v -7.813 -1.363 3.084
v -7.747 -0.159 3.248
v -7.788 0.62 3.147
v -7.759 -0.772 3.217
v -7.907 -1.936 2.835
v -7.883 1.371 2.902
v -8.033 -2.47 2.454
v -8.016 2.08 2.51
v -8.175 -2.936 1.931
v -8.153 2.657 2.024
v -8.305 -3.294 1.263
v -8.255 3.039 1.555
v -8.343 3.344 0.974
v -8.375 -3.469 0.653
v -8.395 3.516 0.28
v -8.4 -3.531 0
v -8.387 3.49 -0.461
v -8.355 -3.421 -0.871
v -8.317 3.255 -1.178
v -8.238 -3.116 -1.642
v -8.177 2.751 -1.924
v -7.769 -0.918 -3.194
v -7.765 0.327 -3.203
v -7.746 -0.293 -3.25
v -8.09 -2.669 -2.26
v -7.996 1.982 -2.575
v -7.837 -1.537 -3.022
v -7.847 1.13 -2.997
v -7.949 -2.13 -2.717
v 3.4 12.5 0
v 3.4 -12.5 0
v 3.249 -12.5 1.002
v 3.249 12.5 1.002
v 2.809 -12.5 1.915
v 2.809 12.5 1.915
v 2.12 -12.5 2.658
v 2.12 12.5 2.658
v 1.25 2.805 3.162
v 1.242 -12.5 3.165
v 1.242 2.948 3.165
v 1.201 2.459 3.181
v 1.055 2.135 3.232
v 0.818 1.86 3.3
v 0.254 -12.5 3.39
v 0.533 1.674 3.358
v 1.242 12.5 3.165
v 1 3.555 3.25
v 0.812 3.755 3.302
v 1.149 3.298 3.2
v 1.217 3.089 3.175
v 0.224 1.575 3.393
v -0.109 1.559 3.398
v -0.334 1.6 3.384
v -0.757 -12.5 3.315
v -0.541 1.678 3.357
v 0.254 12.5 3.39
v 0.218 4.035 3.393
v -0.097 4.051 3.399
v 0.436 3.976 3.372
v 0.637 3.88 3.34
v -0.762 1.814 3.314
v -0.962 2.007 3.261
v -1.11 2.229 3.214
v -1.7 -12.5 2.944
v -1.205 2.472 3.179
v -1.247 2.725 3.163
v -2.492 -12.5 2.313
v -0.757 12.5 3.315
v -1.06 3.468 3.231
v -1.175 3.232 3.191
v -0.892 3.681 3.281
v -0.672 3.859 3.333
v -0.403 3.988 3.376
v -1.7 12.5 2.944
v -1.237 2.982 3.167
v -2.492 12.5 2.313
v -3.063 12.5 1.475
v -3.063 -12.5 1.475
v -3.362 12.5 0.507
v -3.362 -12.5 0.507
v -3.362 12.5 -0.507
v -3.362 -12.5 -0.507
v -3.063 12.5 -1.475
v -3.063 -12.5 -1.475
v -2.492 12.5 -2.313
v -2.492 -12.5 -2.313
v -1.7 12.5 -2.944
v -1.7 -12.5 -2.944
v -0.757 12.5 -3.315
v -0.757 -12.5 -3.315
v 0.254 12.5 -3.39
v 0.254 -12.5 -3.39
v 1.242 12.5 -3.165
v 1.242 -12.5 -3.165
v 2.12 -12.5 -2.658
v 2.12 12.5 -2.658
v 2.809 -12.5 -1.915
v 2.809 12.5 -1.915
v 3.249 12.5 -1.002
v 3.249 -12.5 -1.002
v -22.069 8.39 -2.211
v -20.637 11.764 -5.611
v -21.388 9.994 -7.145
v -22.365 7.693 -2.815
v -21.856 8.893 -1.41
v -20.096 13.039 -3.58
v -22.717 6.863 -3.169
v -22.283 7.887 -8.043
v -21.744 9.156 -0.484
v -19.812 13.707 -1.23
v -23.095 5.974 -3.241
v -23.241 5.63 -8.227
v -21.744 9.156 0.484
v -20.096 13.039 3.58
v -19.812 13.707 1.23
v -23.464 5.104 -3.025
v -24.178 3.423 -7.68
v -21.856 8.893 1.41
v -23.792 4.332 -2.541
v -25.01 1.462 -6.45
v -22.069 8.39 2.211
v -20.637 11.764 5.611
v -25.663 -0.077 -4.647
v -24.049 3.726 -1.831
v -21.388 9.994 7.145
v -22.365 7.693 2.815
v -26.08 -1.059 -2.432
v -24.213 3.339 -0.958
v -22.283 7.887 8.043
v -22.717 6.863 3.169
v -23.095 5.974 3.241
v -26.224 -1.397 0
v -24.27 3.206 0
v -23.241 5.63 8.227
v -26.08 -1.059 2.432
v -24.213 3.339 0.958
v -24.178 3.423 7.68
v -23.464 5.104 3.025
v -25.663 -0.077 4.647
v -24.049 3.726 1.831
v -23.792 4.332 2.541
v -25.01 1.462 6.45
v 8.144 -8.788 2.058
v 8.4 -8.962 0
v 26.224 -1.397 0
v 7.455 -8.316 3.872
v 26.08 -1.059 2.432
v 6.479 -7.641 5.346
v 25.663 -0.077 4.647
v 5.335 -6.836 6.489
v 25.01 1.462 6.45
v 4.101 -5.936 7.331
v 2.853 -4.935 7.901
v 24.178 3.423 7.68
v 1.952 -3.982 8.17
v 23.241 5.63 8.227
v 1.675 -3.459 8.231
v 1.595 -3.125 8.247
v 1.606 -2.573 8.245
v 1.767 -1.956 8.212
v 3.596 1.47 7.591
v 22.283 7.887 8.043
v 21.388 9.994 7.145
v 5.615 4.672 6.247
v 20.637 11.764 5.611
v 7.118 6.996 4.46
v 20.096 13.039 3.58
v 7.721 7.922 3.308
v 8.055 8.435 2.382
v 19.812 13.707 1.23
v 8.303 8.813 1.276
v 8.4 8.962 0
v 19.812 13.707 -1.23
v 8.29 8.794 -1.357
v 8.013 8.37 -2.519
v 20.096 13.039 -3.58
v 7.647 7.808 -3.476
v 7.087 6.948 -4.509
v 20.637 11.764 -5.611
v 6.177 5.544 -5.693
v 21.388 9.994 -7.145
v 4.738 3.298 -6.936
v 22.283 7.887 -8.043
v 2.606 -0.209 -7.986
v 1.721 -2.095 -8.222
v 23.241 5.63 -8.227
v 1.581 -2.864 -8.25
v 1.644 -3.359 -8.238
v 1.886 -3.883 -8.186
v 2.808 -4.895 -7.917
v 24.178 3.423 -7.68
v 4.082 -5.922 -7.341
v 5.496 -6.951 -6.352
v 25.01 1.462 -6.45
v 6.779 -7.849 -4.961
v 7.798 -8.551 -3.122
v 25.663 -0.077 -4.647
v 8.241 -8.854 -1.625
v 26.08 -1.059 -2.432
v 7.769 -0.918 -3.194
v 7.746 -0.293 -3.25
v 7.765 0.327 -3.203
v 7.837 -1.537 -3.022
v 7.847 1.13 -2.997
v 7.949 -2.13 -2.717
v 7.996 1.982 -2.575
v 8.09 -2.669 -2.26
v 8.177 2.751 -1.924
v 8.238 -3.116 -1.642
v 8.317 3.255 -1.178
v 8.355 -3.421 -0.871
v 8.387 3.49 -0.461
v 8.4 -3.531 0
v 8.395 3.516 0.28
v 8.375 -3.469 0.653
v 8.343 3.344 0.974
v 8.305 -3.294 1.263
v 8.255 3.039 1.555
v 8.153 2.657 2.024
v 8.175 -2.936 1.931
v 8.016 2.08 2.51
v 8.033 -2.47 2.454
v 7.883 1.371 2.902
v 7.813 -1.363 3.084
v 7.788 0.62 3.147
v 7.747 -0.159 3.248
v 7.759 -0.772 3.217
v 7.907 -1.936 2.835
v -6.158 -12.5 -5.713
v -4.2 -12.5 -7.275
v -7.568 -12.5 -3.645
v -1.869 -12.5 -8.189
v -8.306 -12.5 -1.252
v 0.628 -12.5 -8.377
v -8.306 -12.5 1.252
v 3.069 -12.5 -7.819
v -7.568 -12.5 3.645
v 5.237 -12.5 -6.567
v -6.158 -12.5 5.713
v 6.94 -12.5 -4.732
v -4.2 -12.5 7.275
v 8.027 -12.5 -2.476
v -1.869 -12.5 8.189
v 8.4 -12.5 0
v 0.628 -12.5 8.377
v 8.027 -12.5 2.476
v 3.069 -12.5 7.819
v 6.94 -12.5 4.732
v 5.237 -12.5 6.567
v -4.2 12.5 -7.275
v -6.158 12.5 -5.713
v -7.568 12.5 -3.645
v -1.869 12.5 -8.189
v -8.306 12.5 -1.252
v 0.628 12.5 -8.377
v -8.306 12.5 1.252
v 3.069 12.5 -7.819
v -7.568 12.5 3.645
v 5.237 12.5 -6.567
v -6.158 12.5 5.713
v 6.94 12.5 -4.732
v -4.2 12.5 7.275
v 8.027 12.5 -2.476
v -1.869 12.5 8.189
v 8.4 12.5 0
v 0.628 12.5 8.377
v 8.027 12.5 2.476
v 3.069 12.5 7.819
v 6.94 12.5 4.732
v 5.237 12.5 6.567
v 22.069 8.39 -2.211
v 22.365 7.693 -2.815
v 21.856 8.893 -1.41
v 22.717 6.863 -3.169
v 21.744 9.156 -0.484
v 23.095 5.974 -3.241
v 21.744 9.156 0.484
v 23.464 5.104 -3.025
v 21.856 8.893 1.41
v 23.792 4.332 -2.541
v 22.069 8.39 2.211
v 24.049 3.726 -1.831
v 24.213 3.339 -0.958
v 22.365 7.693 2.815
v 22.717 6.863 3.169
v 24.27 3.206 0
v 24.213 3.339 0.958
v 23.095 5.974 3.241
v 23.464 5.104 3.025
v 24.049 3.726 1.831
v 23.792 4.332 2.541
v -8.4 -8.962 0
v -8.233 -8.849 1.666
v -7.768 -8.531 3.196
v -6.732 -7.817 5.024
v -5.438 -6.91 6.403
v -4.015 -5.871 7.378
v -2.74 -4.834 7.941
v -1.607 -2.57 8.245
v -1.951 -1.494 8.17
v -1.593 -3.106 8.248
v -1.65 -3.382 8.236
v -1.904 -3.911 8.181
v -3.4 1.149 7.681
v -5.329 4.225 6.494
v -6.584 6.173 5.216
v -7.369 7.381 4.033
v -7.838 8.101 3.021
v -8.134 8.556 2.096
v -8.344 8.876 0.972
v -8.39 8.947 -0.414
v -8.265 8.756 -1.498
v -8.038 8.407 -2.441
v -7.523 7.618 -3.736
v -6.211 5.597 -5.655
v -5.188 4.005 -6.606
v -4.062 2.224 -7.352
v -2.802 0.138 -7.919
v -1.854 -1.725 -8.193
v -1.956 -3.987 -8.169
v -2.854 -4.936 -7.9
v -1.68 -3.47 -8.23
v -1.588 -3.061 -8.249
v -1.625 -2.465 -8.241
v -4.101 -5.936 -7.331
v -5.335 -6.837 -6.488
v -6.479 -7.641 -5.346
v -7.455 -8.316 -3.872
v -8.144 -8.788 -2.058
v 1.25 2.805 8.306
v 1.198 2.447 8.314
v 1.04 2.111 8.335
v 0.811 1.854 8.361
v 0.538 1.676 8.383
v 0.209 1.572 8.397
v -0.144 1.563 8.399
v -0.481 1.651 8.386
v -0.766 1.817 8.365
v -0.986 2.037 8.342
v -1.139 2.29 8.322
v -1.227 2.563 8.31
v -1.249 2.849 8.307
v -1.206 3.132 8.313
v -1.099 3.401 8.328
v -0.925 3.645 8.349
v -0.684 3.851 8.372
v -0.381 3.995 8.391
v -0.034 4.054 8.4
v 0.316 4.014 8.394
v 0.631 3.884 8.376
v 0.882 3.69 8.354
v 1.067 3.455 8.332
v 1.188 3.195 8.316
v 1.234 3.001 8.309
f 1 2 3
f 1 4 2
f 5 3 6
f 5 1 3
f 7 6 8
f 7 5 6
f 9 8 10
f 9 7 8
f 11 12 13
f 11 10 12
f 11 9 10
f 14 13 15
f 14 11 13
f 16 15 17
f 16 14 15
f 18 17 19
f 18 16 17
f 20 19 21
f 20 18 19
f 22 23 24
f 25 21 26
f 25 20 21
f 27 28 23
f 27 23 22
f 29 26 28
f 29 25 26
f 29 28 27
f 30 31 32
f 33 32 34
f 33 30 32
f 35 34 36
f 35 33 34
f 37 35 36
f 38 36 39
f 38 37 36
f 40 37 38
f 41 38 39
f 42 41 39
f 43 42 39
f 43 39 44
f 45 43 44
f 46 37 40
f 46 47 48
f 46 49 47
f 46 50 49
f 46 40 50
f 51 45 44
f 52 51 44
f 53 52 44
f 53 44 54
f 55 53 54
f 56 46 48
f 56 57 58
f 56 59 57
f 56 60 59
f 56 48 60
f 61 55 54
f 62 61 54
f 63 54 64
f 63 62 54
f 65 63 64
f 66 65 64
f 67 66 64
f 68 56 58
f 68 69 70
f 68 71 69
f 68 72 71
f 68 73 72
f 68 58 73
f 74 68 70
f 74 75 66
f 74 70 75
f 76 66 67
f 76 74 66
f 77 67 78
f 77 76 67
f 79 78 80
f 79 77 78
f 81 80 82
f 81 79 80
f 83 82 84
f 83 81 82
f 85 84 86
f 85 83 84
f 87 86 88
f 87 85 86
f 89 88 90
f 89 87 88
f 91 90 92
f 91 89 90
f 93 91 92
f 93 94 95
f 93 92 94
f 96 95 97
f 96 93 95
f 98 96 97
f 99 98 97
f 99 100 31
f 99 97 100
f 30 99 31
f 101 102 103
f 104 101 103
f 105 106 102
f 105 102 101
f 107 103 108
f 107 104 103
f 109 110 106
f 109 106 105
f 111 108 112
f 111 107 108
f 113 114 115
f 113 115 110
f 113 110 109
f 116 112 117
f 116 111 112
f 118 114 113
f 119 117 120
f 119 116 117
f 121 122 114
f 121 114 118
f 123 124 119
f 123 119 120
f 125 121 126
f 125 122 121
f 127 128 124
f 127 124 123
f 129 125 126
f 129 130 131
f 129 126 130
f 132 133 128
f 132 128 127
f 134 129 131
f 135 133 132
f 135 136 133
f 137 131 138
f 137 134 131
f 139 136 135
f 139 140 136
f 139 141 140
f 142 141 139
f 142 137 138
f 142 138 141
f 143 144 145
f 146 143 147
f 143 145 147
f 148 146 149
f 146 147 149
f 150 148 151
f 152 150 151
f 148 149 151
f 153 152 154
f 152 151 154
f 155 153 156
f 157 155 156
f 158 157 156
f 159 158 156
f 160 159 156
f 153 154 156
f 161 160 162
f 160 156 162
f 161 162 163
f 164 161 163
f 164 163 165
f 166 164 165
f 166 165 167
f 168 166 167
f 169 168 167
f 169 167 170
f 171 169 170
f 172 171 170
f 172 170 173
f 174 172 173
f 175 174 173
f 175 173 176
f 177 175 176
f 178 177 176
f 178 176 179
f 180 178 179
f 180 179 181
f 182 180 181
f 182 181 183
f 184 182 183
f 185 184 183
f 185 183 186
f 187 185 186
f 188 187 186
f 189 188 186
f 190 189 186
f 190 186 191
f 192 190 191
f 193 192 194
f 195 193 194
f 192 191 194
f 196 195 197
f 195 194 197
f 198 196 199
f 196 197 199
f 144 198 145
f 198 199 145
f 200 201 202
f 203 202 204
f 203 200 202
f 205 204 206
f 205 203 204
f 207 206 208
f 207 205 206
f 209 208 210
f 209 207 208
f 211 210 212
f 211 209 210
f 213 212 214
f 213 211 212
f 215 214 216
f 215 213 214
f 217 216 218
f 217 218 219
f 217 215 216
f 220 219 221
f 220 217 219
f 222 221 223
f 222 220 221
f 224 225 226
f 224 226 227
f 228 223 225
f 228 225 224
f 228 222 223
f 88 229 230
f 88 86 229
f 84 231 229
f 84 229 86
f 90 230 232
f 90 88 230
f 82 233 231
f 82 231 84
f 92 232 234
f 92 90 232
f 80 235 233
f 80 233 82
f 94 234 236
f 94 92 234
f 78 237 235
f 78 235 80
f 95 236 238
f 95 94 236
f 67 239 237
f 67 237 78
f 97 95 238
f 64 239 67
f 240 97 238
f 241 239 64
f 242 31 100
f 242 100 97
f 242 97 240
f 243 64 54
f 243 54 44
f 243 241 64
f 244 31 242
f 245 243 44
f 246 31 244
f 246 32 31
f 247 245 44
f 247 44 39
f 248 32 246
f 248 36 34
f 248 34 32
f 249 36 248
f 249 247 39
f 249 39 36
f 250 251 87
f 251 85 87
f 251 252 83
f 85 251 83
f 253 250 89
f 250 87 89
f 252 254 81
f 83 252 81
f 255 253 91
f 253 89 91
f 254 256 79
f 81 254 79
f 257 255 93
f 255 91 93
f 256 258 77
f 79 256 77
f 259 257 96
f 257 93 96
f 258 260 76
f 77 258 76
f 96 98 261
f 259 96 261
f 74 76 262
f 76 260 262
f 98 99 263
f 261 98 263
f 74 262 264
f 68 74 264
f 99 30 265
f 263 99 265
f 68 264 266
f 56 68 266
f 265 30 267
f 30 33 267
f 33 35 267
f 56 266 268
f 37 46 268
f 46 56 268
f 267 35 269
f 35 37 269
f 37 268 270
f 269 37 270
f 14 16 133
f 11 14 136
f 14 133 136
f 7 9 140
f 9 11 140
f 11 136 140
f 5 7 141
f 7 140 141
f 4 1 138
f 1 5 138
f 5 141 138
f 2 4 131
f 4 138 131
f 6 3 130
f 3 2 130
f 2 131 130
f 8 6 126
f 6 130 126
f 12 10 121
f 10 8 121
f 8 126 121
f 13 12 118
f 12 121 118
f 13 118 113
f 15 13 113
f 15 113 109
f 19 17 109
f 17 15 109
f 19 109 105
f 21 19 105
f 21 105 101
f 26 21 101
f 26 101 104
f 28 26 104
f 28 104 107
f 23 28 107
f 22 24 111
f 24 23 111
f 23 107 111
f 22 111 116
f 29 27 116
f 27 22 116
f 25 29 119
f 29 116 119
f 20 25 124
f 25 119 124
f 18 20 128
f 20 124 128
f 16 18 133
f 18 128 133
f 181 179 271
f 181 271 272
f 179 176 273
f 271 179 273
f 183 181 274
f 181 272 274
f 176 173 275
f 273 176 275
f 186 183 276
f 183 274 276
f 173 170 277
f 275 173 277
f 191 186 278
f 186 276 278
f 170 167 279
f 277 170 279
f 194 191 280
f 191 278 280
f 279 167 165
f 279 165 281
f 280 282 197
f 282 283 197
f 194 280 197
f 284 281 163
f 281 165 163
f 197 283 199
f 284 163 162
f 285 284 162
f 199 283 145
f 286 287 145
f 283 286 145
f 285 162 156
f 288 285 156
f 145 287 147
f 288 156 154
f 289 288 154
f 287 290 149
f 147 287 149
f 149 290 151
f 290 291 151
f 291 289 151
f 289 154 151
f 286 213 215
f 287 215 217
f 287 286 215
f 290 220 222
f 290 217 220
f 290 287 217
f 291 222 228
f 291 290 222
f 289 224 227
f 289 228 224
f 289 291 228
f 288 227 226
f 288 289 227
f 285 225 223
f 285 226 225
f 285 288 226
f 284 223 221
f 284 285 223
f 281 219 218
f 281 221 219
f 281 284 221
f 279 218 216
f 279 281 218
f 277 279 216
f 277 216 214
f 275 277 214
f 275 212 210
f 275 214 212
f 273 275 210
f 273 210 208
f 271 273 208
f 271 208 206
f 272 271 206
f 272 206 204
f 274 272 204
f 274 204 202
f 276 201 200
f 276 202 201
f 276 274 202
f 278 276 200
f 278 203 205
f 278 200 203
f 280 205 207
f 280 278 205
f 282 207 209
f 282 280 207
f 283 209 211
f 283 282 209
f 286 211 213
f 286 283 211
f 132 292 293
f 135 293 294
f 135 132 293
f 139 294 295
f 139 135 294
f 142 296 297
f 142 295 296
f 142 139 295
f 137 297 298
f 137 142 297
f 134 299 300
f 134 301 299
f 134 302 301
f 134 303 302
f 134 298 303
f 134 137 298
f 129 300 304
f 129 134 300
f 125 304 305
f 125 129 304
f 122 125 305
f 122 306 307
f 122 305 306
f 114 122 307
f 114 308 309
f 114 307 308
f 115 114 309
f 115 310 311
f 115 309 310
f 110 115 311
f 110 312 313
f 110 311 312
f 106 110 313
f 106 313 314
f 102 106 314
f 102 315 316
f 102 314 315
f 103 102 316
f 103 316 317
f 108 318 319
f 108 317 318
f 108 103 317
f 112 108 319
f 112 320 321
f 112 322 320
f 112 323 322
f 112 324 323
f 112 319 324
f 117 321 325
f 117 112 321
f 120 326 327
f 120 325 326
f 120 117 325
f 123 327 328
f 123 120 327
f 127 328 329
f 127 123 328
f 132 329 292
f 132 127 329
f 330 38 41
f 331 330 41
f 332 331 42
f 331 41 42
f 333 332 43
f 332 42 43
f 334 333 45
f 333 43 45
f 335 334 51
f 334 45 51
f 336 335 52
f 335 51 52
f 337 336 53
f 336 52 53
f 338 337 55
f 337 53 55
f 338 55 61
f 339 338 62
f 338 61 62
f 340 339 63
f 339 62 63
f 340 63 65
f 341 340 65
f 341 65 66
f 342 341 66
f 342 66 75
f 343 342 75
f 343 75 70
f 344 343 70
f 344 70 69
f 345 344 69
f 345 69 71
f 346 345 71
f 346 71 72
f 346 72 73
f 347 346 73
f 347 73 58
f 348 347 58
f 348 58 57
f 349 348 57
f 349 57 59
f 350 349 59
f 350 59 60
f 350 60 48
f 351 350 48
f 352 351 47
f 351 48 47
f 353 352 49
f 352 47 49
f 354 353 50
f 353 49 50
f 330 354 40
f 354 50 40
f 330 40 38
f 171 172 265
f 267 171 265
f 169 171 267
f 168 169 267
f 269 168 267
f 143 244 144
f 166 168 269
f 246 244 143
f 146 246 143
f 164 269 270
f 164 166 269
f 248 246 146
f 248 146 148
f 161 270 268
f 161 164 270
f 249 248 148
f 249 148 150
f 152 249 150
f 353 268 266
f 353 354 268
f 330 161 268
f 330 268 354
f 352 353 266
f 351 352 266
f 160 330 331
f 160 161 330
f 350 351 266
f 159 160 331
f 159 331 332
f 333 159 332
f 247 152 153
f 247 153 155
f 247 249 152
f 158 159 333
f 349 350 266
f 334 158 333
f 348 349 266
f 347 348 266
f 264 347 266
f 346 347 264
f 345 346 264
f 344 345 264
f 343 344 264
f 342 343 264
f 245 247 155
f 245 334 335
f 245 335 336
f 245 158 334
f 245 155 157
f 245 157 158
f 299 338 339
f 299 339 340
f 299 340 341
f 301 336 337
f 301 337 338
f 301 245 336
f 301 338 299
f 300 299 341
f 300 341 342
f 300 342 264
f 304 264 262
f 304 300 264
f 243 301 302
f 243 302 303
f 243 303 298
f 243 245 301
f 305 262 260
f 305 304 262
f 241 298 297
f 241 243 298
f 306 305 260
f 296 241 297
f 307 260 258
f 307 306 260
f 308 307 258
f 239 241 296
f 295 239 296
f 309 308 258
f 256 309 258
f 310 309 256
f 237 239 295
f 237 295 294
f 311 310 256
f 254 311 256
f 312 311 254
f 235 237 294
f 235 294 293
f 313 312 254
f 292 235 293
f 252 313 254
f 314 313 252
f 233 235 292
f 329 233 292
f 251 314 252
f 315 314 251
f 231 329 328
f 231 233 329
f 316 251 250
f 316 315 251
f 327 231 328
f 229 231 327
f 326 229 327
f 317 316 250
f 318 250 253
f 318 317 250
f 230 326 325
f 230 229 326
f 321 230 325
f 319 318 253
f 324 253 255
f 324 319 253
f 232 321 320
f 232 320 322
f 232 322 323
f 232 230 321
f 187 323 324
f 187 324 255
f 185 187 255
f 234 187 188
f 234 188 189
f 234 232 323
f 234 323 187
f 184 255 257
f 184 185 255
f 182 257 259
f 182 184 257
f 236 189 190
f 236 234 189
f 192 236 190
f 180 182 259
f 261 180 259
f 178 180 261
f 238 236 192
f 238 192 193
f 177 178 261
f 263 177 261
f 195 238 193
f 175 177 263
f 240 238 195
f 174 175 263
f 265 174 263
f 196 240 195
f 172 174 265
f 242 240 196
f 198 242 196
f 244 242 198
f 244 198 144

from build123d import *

# Parameters (mm, degrees)
F0_R     = 8.4
F0_R_2   = 3.4
F1_DEPTH = 12.5
F4_R     = 8.25
F4_R_2   = 3.25
F8_D     = 2.5
F8_DEPTH = 101
F8_TIP   = 0.7510757738


with BuildPart() as f1:
    # F0 (on Front) → F1 (new body, symmetric)
    with BuildSketch(Plane.XZ):
        Circle(F0_R)
        Circle(F0_R_2, mode=Mode.SUBTRACT)
    extrude(amount=F1_DEPTH, both=True)

    # F4 (on face) → F5 (join, up to the next surface of F1)
    with BuildSketch(Plane(origin=(-21.7175651559, 9.2185594781, 0), x_dir=(-0.3907311285, -0.9205048535, 0), z_dir=(-0.9205048535, 0.3907311285, 0))):
        with Locations((3.2821414793, 0)):
            Circle(F4_R)
        with Locations((3.2821414793, 0)):
            Circle(F4_R_2, mode=Mode.SUBTRACT)
    extrude(until=Until.NEXT, dir=(0.9205048535, -0.3907311285, 0))

    # F6: F1 across plane


with BuildPart() as f1_1:
    add(f1.part)
    add(f1.part.mirror(Plane.YZ))

    # F8 (one way)
    with BuildSketch(Plane(origin=(0, 0, 0), x_dir=(1, 0, 0), z_dir=(0, 0, -1))):
        with Locations((0, -2.8046087828)):
            Circle(F8_D / 2)
    extrude(amount=-F8_DEPTH, mode=Mode.SUBTRACT)
    with Locations(Plane(origin=(0, 0, 0), x_dir=(1, 0, 0), z_dir=(0, 0, -1))):
        with Locations((0, -2.8046087828)):
            with Locations((0, 0, -(F8_DEPTH + F8_TIP / 2))):  # 118° drill point
                Cone(0, F8_D / 2, F8_TIP, mode=Mode.SUBTRACT)


solid = f1_1.part
